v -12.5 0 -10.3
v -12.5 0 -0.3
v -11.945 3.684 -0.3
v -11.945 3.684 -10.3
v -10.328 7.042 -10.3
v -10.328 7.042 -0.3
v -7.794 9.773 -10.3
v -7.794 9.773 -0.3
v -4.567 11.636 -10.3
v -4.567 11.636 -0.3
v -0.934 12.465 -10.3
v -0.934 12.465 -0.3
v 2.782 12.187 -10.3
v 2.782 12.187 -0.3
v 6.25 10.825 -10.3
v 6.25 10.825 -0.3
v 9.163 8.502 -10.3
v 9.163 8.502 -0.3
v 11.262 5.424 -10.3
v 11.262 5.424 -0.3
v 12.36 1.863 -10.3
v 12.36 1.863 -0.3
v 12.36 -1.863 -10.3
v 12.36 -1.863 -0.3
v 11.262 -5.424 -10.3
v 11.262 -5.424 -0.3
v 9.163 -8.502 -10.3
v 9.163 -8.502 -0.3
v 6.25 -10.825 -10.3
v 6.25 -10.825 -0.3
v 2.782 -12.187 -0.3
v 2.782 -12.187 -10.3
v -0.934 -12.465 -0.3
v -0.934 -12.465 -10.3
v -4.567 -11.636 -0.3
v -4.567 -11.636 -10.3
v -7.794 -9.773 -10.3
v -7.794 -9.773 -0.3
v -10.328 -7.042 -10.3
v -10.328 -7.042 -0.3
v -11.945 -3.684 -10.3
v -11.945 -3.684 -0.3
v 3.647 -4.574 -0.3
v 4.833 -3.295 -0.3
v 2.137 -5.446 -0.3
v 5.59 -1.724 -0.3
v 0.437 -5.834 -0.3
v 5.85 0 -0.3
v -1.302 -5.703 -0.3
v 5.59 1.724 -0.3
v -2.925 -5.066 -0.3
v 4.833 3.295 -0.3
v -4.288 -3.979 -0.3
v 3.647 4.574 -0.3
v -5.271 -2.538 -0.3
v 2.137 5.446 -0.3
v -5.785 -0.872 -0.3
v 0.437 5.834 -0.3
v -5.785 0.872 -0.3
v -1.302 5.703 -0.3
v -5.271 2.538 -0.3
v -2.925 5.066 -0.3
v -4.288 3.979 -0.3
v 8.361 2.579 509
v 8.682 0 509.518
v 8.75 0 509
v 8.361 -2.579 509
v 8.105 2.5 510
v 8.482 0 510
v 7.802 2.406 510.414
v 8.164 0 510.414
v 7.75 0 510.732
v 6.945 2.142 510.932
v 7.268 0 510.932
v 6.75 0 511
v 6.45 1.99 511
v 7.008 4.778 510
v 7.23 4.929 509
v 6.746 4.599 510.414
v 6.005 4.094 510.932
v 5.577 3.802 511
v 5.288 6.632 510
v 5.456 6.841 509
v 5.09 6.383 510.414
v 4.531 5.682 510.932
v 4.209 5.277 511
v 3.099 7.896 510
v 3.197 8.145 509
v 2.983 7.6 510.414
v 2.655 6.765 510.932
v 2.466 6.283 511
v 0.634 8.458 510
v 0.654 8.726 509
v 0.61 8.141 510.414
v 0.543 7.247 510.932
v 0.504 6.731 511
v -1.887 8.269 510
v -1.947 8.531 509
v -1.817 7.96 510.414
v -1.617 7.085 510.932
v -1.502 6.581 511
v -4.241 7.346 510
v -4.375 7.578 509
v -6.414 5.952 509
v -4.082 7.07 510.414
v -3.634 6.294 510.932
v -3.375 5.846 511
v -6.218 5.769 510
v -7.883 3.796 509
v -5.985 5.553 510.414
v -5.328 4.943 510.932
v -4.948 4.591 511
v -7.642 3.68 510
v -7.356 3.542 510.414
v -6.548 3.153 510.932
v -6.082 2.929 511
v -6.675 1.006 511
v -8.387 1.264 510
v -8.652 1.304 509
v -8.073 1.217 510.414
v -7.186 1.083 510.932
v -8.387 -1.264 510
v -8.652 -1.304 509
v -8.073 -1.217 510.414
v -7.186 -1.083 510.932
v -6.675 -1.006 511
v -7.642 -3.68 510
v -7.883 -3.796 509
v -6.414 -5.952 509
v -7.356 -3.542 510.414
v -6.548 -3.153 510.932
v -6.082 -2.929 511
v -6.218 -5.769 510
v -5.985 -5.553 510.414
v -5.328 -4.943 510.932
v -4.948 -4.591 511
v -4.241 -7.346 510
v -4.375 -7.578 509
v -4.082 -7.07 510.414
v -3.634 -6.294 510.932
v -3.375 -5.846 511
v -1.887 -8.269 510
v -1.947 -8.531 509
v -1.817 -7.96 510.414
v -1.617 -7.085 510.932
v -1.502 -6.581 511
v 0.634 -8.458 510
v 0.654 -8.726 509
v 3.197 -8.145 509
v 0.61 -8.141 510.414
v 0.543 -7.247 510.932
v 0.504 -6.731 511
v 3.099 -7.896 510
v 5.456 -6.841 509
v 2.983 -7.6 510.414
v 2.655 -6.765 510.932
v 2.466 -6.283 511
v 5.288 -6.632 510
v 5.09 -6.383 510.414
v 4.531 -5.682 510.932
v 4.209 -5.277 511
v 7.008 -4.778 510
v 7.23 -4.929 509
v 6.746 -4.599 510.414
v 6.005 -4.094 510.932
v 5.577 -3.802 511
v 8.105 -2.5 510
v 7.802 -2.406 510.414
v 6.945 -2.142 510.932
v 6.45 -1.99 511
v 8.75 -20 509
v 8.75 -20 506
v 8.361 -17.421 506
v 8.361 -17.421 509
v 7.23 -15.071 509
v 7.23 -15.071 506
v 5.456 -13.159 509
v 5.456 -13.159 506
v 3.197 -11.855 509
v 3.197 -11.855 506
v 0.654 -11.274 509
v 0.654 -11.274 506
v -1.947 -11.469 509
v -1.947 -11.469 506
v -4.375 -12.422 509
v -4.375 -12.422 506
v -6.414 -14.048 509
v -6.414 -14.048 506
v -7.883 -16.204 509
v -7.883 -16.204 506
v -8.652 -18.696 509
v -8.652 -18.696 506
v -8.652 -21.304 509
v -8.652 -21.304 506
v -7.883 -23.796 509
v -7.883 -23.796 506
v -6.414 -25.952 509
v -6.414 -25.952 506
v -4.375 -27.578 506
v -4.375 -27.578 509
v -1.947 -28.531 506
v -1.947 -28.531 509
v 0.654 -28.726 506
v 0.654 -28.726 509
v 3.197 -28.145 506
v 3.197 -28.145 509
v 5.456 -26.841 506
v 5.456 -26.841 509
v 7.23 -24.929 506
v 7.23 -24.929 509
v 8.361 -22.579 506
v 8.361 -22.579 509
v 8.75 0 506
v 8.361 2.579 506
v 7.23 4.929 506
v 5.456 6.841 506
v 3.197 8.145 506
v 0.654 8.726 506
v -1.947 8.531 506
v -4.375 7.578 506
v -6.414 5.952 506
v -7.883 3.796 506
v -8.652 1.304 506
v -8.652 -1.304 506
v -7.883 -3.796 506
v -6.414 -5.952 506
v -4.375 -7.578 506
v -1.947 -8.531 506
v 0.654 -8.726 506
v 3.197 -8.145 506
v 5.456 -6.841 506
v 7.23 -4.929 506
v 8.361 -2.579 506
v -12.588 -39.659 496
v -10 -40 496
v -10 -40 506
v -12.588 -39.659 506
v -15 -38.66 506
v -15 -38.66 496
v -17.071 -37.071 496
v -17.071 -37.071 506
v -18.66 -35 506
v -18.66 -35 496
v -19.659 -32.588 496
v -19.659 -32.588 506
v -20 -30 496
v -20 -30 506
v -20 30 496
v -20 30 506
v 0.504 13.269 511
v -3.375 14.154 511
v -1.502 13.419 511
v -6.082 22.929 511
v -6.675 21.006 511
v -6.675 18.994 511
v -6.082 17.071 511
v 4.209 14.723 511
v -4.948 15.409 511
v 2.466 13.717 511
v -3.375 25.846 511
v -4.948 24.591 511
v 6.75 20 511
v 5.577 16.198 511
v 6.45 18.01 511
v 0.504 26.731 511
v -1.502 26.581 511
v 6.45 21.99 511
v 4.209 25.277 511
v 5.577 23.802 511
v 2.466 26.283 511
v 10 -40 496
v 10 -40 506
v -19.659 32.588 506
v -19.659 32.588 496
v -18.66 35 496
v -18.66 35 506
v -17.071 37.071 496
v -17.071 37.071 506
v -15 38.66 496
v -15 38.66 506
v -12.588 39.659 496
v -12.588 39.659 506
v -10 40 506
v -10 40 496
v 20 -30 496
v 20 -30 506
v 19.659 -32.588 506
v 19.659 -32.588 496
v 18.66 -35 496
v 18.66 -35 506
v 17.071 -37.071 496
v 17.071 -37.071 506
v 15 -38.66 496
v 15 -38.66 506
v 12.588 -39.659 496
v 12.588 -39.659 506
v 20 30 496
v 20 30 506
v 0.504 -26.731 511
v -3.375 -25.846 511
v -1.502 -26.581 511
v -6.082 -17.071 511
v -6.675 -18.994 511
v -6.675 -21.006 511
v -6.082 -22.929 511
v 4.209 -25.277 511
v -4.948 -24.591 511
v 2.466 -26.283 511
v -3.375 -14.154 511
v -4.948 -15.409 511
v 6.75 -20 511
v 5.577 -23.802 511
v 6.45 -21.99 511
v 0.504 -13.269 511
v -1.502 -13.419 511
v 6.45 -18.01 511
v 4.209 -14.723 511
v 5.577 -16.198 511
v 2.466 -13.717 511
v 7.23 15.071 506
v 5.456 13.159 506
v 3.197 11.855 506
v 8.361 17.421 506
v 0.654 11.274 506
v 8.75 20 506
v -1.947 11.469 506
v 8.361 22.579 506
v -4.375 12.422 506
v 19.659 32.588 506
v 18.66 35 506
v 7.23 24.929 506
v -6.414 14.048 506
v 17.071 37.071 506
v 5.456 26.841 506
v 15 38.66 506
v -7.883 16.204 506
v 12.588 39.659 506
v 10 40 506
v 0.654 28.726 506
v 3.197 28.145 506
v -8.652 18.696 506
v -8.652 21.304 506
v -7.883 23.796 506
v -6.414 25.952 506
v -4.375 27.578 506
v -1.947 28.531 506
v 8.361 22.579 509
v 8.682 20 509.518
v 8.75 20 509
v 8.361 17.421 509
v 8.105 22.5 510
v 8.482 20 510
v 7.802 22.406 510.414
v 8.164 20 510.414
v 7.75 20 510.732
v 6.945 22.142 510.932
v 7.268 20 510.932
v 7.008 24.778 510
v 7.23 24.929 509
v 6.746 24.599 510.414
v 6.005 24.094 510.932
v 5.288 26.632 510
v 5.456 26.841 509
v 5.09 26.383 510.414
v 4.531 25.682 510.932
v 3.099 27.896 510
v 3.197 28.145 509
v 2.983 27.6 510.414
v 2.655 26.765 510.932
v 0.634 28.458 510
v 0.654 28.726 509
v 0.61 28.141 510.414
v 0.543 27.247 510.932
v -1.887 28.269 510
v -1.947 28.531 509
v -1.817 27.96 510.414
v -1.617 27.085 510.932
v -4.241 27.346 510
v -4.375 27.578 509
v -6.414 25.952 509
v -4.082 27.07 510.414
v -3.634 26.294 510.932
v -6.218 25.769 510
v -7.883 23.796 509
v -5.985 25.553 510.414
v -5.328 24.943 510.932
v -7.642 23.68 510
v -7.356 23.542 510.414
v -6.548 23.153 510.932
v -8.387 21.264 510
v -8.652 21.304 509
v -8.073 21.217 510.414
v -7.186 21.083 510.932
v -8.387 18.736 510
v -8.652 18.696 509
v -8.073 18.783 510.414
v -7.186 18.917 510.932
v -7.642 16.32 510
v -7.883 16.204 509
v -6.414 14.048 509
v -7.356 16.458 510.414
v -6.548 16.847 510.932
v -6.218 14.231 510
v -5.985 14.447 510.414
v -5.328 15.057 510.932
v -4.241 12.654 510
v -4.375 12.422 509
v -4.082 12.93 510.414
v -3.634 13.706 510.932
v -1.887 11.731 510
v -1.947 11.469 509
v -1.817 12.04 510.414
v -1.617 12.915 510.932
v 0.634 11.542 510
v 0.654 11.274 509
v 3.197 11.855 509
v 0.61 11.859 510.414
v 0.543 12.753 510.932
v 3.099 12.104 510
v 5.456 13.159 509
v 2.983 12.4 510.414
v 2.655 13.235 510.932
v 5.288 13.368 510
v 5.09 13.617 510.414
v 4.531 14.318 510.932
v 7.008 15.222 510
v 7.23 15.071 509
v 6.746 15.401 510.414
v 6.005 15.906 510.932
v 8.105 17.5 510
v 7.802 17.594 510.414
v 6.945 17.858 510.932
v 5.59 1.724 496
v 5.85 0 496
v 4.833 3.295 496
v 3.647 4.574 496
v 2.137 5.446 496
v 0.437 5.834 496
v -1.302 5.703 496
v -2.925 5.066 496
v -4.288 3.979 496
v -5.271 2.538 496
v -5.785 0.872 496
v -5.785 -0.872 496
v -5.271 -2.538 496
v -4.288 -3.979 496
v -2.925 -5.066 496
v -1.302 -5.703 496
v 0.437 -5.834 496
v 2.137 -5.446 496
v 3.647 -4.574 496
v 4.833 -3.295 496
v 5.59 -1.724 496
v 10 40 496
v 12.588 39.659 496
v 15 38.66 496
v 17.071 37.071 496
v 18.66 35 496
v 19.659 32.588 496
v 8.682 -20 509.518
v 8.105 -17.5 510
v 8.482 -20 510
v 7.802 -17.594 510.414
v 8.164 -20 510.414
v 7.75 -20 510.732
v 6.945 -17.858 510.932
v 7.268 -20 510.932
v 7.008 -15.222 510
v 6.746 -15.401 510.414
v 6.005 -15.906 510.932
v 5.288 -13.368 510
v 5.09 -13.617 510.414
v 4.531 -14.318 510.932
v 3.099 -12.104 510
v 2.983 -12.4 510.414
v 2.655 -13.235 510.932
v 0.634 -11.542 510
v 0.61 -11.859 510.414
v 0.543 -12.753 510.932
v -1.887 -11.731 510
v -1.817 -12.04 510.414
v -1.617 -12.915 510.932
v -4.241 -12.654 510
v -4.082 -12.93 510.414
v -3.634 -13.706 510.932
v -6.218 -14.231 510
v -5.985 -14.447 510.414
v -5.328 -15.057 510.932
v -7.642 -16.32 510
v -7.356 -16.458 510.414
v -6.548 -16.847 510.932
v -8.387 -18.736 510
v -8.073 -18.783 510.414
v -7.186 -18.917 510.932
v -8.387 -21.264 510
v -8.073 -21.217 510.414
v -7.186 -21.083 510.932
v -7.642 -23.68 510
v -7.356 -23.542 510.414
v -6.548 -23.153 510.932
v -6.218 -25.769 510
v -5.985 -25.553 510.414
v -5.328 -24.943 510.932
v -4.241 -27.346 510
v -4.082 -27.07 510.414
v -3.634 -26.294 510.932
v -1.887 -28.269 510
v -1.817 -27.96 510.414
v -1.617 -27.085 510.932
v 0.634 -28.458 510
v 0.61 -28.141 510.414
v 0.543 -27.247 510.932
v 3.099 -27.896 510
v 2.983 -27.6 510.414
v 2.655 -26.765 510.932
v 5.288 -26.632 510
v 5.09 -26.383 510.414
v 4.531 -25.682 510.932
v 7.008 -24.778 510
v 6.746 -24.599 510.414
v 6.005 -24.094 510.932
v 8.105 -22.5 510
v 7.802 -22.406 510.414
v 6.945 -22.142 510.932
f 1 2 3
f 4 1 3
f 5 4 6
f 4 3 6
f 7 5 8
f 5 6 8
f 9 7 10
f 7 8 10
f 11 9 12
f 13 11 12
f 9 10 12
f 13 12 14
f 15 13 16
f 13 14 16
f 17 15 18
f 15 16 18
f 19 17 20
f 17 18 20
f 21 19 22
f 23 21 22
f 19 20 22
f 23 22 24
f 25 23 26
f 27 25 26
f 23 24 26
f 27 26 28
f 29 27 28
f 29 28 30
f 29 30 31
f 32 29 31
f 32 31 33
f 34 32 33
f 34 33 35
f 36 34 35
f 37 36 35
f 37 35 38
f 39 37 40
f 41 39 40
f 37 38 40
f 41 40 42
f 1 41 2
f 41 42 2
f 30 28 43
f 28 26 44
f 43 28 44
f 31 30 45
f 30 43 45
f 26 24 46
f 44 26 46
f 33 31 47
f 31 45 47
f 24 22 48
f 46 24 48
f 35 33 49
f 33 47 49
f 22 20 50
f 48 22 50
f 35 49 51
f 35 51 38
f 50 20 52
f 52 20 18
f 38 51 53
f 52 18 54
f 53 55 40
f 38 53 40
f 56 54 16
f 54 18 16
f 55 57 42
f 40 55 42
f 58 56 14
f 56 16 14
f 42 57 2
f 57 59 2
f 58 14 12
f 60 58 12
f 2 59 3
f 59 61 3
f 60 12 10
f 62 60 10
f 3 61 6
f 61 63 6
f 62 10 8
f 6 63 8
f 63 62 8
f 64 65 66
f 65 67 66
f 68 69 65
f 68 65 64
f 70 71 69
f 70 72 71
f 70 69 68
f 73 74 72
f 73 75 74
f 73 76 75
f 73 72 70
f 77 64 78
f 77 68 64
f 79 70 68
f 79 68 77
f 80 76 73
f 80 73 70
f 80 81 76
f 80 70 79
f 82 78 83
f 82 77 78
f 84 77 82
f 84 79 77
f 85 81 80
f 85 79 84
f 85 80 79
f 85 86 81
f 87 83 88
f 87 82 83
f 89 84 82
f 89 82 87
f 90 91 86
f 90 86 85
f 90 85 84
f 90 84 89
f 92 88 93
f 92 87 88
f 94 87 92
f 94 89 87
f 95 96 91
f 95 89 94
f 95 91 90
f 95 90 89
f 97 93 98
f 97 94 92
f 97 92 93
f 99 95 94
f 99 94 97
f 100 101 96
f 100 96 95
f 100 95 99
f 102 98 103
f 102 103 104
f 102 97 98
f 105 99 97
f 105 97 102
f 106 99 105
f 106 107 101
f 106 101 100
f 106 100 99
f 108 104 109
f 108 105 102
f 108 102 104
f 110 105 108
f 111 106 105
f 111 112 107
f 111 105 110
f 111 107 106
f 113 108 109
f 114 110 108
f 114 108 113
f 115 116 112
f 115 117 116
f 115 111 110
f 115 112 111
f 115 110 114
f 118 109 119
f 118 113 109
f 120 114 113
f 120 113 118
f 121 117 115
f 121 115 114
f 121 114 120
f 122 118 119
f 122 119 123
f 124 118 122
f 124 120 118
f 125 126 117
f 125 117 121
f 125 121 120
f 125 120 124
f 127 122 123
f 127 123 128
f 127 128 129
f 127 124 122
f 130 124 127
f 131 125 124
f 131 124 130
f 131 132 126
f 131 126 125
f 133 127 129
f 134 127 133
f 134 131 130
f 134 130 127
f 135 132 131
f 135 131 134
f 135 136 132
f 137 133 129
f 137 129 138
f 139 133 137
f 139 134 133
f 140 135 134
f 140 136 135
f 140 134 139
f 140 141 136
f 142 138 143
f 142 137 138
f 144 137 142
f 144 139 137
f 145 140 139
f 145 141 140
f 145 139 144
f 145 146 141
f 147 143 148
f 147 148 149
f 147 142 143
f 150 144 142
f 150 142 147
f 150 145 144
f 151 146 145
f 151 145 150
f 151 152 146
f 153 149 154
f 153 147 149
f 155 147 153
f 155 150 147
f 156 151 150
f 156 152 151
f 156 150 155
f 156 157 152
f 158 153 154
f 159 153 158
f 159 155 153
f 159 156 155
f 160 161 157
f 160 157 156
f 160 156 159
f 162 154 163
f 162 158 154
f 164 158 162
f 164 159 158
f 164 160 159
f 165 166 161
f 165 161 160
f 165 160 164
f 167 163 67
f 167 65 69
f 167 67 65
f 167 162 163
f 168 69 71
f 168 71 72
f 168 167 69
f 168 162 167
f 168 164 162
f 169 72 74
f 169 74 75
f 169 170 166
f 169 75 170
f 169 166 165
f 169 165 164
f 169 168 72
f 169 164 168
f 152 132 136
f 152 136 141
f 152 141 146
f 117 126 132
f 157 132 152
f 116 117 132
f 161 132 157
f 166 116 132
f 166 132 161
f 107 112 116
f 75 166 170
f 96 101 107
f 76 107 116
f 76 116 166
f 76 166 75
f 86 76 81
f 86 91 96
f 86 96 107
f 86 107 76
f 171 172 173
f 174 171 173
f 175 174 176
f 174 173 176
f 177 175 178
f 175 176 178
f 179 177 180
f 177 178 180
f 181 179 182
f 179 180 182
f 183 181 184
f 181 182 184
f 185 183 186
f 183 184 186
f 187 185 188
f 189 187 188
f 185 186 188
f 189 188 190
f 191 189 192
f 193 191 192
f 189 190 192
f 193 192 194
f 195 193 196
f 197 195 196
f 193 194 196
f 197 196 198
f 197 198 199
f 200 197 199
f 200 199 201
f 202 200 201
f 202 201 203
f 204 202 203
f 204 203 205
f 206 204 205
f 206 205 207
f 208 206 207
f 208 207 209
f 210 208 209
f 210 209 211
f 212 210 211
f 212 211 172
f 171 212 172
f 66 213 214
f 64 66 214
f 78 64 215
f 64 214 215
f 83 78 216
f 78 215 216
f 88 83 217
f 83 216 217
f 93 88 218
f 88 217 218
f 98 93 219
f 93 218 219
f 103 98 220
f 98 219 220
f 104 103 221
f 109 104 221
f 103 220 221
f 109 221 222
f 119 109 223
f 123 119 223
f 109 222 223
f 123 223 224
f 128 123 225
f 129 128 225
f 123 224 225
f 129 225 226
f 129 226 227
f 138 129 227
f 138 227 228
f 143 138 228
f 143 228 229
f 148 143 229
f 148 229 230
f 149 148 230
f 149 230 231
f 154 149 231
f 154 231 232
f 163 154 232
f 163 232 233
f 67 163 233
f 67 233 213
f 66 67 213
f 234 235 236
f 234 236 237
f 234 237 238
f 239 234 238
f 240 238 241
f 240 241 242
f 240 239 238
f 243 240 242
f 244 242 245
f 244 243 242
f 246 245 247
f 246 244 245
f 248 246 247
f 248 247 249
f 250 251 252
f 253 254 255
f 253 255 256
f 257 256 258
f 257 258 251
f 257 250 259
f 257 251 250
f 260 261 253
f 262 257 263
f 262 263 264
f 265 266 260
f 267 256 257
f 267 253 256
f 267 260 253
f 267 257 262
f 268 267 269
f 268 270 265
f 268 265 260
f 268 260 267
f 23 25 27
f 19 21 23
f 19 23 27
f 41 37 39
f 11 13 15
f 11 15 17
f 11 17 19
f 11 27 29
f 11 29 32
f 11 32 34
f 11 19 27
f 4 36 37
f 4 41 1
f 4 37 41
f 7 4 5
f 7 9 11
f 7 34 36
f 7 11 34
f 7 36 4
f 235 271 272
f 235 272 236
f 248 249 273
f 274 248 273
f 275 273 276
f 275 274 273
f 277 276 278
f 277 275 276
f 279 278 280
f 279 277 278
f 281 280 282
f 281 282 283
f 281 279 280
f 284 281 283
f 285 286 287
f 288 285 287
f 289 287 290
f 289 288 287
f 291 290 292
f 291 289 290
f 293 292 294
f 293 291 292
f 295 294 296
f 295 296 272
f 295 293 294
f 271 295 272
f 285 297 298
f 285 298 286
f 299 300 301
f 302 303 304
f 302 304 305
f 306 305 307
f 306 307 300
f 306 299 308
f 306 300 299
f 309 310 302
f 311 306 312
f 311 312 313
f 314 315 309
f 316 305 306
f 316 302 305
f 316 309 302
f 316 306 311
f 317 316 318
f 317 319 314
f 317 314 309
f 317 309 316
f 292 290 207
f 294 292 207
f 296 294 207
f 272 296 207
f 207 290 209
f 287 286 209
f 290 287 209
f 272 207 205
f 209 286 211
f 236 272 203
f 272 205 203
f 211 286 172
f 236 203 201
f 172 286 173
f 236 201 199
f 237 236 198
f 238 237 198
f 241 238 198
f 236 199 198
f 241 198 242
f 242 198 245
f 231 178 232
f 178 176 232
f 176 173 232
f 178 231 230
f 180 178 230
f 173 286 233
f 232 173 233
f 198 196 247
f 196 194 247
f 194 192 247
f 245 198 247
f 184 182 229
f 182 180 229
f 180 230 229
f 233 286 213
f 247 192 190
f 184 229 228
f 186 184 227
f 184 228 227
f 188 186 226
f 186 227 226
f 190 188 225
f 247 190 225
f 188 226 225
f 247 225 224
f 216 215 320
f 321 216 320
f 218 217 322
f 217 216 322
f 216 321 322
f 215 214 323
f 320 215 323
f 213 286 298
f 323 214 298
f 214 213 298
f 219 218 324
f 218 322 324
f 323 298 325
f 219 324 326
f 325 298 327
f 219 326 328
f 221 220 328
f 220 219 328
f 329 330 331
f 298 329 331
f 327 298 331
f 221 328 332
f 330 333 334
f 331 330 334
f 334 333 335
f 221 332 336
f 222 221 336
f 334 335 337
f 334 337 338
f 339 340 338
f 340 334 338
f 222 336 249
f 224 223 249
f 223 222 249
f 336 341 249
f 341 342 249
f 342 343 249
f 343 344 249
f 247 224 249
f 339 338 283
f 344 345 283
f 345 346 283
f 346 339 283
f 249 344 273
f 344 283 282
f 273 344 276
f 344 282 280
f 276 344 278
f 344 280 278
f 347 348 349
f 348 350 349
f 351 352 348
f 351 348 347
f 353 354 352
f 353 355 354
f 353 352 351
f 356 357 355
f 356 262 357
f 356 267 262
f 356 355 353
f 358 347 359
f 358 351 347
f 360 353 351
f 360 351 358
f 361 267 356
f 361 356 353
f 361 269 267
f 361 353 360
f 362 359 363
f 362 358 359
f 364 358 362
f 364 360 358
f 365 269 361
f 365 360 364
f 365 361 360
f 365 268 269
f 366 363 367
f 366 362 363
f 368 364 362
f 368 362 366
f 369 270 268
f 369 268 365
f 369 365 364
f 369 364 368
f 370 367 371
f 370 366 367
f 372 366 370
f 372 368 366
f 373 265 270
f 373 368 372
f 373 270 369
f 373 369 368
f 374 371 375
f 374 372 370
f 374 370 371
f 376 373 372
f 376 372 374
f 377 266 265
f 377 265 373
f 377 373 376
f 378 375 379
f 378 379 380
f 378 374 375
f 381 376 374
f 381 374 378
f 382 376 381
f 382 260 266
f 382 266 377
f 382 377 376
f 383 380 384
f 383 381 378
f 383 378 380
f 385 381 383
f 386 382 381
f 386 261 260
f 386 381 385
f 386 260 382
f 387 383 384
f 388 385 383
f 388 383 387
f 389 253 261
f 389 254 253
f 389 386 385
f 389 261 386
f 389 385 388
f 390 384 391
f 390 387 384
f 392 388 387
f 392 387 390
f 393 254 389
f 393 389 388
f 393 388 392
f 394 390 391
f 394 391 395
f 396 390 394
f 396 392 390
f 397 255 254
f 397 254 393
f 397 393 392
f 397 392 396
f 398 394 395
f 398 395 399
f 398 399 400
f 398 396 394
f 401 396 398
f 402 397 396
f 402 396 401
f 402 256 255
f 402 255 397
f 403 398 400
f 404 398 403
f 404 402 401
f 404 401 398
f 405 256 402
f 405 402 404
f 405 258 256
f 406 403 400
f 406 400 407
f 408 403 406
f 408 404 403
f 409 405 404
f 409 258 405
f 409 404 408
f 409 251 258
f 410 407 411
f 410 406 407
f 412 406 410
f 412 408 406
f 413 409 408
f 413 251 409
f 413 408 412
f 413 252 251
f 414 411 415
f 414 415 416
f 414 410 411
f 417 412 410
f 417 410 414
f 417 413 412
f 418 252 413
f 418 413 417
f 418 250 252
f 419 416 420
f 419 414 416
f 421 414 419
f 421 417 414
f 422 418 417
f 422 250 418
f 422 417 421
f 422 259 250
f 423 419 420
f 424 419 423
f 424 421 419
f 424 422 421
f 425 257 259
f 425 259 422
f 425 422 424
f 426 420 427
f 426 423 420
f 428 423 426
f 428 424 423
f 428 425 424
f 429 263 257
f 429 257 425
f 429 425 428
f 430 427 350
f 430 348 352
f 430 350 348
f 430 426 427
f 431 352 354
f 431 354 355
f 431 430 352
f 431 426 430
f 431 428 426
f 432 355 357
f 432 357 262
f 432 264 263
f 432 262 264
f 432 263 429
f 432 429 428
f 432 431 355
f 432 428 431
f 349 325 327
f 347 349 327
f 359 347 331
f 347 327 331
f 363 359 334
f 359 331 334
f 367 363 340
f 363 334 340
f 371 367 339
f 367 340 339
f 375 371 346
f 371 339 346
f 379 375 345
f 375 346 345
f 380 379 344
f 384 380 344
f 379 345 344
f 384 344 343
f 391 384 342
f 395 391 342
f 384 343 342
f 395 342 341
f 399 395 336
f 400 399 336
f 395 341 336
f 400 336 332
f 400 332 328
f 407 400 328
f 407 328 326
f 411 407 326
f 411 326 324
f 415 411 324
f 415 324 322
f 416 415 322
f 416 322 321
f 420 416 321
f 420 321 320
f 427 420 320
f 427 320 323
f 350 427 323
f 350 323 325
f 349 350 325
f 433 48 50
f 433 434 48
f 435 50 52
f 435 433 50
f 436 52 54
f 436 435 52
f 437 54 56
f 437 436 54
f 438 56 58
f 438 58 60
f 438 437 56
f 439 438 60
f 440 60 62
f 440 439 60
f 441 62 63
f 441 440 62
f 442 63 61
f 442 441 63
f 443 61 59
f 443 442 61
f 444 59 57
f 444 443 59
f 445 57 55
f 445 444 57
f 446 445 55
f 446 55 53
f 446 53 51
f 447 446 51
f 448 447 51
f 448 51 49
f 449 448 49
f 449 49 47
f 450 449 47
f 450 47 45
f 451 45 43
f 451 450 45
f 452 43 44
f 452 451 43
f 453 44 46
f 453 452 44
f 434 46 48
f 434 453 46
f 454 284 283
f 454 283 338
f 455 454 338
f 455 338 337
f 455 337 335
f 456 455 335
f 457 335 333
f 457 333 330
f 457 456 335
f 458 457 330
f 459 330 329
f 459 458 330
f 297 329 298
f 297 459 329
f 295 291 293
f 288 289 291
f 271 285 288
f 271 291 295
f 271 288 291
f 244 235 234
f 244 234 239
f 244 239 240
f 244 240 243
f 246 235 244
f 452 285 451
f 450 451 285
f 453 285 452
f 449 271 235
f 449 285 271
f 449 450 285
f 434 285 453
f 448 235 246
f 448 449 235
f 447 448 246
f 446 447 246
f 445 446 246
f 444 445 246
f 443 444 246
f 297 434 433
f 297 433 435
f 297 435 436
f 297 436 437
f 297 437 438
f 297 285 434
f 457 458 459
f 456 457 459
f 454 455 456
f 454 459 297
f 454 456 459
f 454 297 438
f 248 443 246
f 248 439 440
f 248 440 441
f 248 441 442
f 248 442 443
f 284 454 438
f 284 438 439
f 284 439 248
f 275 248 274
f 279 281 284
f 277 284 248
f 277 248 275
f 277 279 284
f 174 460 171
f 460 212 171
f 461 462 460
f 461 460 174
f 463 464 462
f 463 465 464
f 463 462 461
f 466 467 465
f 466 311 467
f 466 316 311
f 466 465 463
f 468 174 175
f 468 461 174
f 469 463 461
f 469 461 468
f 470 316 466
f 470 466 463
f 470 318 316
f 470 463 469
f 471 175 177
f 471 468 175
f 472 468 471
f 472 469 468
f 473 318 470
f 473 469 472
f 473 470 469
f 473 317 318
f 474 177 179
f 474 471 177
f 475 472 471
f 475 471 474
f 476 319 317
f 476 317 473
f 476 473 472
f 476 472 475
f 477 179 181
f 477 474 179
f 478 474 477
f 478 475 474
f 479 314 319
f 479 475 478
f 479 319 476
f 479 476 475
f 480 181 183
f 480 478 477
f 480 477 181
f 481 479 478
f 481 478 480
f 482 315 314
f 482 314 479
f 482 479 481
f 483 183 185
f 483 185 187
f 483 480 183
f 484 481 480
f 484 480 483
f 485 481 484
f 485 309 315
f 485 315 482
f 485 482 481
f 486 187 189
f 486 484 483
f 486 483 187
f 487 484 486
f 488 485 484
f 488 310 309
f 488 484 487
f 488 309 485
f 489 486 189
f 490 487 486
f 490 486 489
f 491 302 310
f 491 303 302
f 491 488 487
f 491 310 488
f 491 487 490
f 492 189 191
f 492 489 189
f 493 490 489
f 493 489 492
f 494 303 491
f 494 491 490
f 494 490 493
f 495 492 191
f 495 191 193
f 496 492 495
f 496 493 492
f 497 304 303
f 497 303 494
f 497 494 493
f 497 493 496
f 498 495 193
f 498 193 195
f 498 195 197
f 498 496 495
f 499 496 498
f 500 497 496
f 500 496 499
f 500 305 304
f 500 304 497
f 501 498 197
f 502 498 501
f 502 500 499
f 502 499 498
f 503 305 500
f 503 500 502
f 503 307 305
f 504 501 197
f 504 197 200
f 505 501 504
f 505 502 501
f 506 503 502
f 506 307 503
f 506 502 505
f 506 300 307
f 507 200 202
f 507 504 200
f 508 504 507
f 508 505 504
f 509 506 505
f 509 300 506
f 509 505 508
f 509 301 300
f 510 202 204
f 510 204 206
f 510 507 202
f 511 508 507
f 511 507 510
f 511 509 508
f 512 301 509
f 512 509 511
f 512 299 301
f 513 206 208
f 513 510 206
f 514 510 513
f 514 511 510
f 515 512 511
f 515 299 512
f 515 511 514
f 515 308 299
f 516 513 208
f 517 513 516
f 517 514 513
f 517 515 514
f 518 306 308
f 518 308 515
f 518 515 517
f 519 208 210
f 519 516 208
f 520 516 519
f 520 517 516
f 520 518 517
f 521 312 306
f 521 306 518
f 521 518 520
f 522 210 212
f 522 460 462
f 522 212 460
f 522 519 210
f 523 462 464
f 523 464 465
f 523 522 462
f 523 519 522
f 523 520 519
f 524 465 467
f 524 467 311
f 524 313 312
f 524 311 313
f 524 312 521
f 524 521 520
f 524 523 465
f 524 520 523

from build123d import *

# Parameters (mm, degrees)
SKETCH2_R                = 5.85
BOSS_EXTRUDE1_DEPTH      = 496
BOSS_EXTRUDE1_DEPTH_BACK = 0.3
SKETCH3_R                = 8.75
BOSS_EXTRUDE2_DEPTH      = 15
FILLET1_R                = 2
BOSS_EXTRUDE3_START      = -25
SKETCH5_R                = 8.75
BOSS_EXTRUDE3_DEPTH      = 15
BOSS_EXTRUDE3_2_DEPTH    = 15
FILLET2_R                = 2
FILLET3_R                = 2
BOSS_EXTRUDE4_START      = -25
BOSS_EXTRUDE4_DEPTH      = 10
SKETCH7_R                = 12.5
BOSS_EXTRUDE5_DEPTH      = 10


with BuildPart() as part:
    # Sketch2 → Boss-Extrude1 (new body, two sides)
    with BuildSketch(Plane.XY) as boss_extrude1_sk:
        Circle(SKETCH2_R)
    extrude(amount=BOSS_EXTRUDE1_DEPTH)
    extrude(boss_extrude1_sk.sketch, amount=-BOSS_EXTRUDE1_DEPTH_BACK)

    # Sketch3 → Boss-Extrude2 (add)
    with BuildSketch(Plane.XY.offset(496)):
        Circle(SKETCH3_R)
    extrude(amount=BOSS_EXTRUDE2_DEPTH)

    # Fillet1
    fillet1_edges = [part.edges().sort_by_distance(p)[0] for p in [
        (-8.75, 0, 511),
    ]]
    fillet(fillet1_edges, radius=FILLET1_R)



with BuildPart() as body_2:
    # Sketch5 → Boss-Extrude3 (new body)
    with BuildSketch(Plane.XY.offset(521).offset(BOSS_EXTRUDE3_START)):
        with Locations((0, 20)):
            Circle(SKETCH5_R)
    extrude(amount=BOSS_EXTRUDE3_DEPTH)

    # Fillet2
    fillet2_edges = [body_2.edges().sort_by_distance(p)[0] for p in [
        (-8.75, 20, 511),
    ]]
    fillet(fillet2_edges, radius=FILLET2_R)


with BuildPart() as body_3:
    # Sketch5 → Boss-Extrude3 2 (new body)
    with BuildSketch(Plane.XY.offset(521).offset(BOSS_EXTRUDE3_START)):
        with Locations((0, -20)):
            Circle(SKETCH5_R)
    extrude(amount=BOSS_EXTRUDE3_2_DEPTH)

    # Fillet3
    fillet3_edges = [body_3.edges().sort_by_distance(p)[0] for p in [
        (-8.75, -20, 511),
    ]]
    fillet(fillet3_edges, radius=FILLET3_R)


with BuildPart() as part_1:
    add(part.part)

    add(body_2.part)  # Boss-Extrude4 merges body 2

    add(body_3.part)  # Boss-Extrude4 merges body 3
    # Sketch6 → Boss-Extrude4 (add)
    with BuildSketch(Plane.XY.offset(521).offset(BOSS_EXTRUDE4_START)):
        with BuildLine():
            Line((10, -40), (-10, -40))
            ThreePointArc((-10, -40), (-17.071067812, -37.071067812), (-20, -30))
            Line((-20, -30), (-20, 30))
            ThreePointArc((-20, 30), (-17.071067812, 37.071067812), (-10, 40))
            Line((-10, 40), (10, 40))
            ThreePointArc((10, 40), (17.071067812, 37.071067812), (20, 30))
            Line((20, 30), (20, -30))
            ThreePointArc((20, -30), (17.071067812, -37.071067812), (10, -40))
        make_face()
    extrude(amount=BOSS_EXTRUDE4_DEPTH)

    # Sketch7 → Boss-Extrude5 (add)
    with BuildSketch(Plane(origin=(0, 0, -0.3), x_dir=(-1, 0, 0), z_dir=(0, 0, -1))):
        Circle(SKETCH7_R)
    extrude(amount=BOSS_EXTRUDE5_DEPTH)


solid = part_1.part
